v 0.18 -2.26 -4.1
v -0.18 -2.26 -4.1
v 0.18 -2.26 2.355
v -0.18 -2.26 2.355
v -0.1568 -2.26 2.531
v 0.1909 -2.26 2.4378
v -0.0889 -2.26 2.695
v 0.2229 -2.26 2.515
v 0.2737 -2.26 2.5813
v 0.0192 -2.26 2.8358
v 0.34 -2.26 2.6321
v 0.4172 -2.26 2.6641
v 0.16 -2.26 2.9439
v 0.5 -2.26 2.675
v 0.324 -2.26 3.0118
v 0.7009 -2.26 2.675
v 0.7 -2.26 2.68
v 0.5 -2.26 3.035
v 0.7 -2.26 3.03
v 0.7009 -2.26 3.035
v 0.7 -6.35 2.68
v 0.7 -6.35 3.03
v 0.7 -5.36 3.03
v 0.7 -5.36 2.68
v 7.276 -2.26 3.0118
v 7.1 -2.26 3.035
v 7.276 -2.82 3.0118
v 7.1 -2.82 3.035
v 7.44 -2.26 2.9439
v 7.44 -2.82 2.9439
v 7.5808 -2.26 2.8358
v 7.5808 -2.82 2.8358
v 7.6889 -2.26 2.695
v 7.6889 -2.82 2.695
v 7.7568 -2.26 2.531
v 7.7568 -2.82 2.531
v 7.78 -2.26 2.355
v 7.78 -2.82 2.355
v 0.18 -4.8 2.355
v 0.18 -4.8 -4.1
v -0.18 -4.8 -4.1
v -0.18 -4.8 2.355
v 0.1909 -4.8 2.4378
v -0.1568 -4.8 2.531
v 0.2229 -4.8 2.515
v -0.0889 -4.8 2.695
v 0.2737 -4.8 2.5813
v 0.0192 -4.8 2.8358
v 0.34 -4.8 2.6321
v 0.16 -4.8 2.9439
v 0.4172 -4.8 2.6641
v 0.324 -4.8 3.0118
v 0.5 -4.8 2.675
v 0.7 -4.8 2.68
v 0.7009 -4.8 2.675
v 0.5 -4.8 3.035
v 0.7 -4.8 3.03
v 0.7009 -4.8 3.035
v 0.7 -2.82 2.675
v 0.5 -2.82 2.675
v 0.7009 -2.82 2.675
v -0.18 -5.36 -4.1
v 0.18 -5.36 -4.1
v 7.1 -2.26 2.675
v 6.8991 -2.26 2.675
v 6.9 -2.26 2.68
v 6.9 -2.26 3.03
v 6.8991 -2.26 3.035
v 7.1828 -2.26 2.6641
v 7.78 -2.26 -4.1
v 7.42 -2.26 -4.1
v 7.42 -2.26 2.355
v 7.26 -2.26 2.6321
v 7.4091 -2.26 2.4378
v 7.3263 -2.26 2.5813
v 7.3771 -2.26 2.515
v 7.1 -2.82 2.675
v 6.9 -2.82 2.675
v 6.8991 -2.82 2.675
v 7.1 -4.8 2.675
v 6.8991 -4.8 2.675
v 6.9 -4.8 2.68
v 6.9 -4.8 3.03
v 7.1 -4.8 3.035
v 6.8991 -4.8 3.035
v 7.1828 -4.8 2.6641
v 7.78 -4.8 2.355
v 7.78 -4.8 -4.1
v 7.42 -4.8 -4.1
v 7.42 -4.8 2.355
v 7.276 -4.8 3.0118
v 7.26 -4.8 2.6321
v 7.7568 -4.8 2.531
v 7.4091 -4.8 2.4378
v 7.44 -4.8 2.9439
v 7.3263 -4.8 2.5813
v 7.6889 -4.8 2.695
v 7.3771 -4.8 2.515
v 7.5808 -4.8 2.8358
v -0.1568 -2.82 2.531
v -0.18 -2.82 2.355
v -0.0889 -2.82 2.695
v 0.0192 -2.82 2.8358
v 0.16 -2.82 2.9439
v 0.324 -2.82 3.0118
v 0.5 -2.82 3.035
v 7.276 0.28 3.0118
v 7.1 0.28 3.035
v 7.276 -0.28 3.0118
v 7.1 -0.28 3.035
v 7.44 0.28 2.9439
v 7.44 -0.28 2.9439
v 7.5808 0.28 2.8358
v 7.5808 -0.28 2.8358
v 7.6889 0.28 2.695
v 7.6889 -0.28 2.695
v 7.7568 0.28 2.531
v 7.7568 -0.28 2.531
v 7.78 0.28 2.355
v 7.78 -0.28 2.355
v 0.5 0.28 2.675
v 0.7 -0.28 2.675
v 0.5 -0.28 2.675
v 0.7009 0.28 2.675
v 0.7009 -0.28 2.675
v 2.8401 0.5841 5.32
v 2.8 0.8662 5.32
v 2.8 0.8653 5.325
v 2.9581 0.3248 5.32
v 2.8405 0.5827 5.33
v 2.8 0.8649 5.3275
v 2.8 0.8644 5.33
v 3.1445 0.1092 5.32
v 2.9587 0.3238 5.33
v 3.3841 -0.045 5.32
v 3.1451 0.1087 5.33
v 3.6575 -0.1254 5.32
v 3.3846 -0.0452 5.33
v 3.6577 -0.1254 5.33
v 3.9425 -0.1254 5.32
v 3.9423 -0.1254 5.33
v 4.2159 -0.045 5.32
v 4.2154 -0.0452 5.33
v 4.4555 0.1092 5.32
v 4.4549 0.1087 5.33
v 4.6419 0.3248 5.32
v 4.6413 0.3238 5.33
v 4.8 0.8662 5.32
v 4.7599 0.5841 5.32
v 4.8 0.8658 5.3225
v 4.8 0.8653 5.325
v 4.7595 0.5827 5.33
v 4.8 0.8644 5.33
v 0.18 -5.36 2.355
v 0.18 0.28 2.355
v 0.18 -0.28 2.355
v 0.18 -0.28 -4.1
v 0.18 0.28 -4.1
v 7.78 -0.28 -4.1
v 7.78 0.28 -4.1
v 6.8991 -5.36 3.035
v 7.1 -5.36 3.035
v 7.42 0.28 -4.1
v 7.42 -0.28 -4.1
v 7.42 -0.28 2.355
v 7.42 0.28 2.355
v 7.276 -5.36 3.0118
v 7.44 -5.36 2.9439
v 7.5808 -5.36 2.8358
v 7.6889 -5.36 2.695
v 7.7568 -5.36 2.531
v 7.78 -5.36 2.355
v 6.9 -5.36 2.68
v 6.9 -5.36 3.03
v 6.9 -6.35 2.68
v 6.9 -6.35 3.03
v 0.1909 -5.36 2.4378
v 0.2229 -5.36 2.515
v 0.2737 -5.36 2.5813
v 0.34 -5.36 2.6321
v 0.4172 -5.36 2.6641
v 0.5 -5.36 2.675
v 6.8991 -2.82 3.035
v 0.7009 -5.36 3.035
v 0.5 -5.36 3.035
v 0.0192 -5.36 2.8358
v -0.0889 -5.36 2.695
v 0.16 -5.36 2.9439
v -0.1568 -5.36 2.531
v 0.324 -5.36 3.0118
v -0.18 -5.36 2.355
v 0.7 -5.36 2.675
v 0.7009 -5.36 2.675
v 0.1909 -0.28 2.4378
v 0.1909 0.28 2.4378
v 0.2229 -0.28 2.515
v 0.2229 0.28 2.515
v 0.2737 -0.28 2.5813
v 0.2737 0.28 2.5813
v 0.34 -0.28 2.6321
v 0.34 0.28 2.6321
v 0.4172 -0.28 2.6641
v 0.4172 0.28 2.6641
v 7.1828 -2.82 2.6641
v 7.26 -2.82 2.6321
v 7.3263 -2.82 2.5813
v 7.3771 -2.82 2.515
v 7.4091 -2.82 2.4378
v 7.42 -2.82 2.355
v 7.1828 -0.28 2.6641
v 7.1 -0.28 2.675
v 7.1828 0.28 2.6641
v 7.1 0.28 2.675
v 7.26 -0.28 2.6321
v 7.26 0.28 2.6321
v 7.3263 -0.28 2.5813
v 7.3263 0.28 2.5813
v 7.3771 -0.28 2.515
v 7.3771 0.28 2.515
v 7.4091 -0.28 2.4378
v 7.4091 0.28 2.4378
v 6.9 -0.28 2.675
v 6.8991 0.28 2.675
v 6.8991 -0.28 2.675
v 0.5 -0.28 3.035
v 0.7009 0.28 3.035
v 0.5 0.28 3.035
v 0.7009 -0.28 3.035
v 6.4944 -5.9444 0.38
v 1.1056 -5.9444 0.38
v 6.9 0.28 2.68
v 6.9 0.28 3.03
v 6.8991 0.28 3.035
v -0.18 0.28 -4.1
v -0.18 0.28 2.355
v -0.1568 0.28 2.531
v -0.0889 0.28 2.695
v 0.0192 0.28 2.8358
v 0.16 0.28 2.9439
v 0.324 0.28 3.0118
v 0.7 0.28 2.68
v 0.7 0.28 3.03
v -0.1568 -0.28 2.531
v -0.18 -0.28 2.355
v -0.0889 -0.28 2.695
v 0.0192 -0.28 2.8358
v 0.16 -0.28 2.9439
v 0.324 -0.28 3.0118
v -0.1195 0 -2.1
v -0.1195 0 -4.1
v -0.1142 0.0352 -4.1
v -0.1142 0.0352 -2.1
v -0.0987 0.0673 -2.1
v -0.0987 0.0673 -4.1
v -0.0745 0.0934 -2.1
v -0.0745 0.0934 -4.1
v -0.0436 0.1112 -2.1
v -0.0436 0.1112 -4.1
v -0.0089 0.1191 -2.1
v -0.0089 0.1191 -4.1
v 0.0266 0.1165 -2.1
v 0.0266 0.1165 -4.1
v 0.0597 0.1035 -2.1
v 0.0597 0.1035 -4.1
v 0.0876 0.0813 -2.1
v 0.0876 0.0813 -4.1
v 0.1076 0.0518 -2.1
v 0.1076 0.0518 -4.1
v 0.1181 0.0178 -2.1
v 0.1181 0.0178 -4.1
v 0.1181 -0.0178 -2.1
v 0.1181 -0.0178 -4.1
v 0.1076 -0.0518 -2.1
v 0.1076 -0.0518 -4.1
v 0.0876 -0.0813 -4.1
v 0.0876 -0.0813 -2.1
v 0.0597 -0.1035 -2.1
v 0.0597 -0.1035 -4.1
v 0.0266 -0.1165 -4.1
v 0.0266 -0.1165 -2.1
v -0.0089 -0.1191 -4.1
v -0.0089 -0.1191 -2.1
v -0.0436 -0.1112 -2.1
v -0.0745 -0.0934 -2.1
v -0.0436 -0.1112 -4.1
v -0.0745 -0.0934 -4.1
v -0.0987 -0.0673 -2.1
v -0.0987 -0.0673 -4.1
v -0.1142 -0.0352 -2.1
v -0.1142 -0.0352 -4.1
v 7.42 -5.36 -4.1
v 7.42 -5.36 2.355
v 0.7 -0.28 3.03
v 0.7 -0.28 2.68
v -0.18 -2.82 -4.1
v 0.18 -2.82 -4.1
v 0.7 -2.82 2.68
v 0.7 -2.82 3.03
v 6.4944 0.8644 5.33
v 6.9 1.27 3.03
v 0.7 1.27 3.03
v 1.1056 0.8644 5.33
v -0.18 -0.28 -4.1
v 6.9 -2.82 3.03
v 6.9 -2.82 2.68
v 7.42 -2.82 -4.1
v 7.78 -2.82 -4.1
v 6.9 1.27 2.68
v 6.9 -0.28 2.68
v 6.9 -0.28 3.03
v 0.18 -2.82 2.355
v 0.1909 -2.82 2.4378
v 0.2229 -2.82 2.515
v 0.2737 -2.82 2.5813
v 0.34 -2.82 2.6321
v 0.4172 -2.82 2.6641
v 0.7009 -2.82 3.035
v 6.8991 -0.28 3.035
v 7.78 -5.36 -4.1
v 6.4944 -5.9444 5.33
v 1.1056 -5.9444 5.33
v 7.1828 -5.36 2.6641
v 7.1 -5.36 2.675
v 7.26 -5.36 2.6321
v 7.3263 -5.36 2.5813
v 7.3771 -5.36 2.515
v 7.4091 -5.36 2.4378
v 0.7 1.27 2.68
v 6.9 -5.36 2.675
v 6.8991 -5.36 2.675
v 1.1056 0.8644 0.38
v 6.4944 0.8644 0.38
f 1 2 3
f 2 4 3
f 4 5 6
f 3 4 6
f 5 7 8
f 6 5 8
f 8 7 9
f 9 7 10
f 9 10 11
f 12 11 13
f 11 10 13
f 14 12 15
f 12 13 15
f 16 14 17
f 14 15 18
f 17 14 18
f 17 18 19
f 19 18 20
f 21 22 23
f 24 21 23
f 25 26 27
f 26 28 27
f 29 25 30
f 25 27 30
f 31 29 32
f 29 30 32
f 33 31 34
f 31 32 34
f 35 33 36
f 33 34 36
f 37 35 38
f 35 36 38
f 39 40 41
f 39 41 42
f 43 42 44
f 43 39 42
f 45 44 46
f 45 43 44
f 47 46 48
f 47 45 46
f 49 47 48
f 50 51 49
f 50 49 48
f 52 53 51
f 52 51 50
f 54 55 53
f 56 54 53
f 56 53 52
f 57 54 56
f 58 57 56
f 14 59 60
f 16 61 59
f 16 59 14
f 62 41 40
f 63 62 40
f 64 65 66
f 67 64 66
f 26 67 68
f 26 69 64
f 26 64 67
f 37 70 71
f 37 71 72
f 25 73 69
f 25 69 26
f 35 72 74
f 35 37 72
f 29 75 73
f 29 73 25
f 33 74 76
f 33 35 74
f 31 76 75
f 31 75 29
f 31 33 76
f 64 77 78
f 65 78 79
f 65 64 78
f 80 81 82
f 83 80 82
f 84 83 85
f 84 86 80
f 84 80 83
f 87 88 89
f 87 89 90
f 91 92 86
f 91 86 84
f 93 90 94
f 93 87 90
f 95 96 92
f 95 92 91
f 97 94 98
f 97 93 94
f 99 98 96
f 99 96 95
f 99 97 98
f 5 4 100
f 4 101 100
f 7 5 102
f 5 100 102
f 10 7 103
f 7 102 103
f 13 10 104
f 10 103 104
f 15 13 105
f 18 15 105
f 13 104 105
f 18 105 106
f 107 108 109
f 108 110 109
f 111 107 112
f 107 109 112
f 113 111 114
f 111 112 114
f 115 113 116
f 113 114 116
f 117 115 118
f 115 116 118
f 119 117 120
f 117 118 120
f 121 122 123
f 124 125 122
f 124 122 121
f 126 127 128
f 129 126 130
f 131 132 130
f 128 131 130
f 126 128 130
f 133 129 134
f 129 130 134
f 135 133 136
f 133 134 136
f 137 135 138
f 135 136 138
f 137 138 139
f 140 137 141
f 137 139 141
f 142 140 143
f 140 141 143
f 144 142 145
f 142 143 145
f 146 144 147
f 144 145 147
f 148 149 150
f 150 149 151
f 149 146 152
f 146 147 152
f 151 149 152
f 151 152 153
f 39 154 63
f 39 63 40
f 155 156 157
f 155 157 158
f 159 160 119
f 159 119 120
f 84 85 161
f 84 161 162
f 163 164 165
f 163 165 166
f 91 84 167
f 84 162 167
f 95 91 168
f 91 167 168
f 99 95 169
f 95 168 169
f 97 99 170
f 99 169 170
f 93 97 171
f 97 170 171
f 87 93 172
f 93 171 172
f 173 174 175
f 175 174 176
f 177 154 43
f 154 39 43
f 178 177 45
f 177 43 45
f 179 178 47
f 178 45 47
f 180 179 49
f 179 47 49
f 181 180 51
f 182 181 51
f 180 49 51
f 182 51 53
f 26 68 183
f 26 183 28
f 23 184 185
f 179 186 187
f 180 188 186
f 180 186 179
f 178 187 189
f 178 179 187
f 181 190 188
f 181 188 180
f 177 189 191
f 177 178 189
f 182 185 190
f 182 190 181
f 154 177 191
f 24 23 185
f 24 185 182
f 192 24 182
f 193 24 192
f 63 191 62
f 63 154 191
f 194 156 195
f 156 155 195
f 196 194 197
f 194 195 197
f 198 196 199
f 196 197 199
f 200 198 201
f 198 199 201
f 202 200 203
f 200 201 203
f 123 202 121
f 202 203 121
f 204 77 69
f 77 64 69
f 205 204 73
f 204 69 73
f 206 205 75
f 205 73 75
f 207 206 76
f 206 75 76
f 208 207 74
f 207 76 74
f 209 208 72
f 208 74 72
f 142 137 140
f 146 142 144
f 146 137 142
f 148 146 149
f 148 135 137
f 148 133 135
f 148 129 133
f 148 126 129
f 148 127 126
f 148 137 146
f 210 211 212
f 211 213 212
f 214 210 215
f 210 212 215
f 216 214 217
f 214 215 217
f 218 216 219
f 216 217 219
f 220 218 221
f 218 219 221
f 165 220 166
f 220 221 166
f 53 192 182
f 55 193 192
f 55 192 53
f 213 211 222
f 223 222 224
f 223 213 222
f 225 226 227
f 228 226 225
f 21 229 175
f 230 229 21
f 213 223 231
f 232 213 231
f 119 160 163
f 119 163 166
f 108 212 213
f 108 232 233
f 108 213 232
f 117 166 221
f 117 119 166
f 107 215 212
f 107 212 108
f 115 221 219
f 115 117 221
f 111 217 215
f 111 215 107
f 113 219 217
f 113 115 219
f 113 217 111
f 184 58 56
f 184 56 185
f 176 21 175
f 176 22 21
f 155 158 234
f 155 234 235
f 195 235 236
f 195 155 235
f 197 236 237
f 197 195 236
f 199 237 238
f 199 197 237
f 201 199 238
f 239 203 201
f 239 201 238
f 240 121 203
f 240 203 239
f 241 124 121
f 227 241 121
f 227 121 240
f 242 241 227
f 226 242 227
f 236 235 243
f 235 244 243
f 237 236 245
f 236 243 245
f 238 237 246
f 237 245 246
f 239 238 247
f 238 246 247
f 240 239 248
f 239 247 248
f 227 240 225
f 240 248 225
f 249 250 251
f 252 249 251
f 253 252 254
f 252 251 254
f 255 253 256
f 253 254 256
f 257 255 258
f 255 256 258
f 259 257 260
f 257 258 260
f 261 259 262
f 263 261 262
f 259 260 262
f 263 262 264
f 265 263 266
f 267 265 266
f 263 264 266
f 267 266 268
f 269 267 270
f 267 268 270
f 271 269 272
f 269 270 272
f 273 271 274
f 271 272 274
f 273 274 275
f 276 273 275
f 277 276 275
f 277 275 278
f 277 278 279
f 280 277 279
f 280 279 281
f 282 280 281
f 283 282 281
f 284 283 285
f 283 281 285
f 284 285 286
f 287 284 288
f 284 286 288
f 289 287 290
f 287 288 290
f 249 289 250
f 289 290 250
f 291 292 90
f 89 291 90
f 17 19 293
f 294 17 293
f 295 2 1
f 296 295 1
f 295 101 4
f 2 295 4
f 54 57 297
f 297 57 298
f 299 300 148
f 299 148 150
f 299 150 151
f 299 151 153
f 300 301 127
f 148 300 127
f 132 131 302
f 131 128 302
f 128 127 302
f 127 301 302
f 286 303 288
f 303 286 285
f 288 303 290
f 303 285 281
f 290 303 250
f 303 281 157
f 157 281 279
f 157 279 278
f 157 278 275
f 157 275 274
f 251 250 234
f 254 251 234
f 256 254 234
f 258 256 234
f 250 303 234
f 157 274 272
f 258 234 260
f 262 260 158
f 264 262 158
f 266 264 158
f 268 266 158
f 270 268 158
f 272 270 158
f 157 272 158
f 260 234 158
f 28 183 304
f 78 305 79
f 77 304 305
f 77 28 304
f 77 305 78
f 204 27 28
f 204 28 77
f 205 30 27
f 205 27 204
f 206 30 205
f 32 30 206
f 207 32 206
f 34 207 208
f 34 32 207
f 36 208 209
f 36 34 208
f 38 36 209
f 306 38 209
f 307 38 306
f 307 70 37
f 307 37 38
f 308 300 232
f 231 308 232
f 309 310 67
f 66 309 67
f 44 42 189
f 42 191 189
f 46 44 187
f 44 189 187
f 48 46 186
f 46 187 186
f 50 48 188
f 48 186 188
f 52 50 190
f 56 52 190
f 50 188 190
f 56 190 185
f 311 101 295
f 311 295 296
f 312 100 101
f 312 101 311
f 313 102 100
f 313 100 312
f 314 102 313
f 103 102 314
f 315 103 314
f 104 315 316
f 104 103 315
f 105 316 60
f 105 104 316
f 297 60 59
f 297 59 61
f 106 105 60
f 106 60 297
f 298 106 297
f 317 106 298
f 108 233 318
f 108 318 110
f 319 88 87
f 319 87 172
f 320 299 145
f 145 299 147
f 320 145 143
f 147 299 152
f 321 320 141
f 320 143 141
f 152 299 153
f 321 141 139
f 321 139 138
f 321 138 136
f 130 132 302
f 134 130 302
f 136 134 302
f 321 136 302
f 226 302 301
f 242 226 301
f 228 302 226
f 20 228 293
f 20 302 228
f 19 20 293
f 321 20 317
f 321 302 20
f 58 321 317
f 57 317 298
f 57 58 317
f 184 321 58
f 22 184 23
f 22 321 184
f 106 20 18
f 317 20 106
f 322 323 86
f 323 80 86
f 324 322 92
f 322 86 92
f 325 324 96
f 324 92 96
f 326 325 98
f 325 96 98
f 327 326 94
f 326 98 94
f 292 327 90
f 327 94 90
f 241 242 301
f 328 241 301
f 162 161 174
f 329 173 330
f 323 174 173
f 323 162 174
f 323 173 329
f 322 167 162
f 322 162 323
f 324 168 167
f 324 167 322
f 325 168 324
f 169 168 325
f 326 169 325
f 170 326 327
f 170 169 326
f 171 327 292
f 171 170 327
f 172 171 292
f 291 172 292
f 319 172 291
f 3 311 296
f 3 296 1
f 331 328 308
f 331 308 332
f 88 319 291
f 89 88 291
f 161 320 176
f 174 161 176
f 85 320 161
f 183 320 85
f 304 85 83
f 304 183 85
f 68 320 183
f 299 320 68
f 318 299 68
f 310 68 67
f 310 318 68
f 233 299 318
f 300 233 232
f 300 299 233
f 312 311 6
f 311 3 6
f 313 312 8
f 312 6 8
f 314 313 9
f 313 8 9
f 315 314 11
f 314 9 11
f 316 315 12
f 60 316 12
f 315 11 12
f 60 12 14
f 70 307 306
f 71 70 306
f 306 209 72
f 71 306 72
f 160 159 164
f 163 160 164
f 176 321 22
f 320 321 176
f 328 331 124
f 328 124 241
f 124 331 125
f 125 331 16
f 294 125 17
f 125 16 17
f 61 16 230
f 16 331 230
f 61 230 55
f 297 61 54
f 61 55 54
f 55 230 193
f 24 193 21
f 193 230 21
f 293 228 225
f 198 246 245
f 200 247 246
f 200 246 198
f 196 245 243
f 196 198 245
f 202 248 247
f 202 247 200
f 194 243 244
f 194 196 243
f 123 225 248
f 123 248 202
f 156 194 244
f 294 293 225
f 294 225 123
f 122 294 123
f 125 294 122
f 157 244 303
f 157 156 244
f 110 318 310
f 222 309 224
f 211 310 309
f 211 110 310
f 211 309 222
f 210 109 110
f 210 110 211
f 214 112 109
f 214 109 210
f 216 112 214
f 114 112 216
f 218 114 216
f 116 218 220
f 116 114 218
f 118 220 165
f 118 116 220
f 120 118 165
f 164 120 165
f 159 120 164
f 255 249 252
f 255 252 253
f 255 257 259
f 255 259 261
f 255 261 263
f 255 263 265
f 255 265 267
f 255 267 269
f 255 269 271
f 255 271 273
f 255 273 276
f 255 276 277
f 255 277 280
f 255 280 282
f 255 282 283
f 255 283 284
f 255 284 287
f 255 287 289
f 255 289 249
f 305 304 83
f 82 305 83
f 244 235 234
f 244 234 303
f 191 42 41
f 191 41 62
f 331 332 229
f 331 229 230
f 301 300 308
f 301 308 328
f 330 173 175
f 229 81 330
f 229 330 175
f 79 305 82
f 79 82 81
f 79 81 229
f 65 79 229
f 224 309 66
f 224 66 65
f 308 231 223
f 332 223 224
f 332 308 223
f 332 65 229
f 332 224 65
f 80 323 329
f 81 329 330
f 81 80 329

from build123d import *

# Parameters (mm, degrees)
EXTRUDE_1_DEPTH     = 4.95
SKETCH_5_W          = 0.36
SKETCH_5_H          = 0.56
SKETCH_5_2_W        = 0.36
SKETCH_5_2_H        = 0.56
EXTRUDE_2_DEPTH     = 4.1
CHAMFER_1_SIZE      = 2.3
CHAMFER_1_SIZE_2    = 0.405552056
SKETCH_6_R          = 1
CUT_EXTRUDE_1_DEPTH = 0.01
SKETCH_7_W          = 10.556189846
SKETCH_7_H          = 3.652287582
CUT_EXTRUDE_2_DEPTH = 20
CHAMFER_2_SIZE      = 2.3
CHAMFER_2_SIZE2     = 0.405552056
SKETCH_8_R          = 0.119462925
CUT_EXTRUDE_3_DEPTH = 2


with BuildPart() as part:
    # Эскиз3 → Вытянуть1 (new body)
    with BuildSketch(Plane.XY.offset(5.33)):
        Polygon((0.7, 1.27), (3.8, 1.27), (6.9, 1.27), (6.9, -8.89), (0.7, -8.89), align=None)
    extrude(amount=-EXTRUDE_1_DEPTH)

    # По траектории1: sweep along a path in Эскиз4
    with BuildLine(Plane(origin=(0, 0, 0), x_dir=(1, 0, 0), z_dir=(0, 1, 0))) as sweep_1_path:
        Line((0, 0), (0, -2.355))
        ThreePointArc((0, -2.355), (0.146446609, -2.708553391), (0.5, -2.855))
        Line((0.5, -2.855), (0.7, -2.855))
        Line((0.7, -2.855), (6.9, -2.855))
        Line((6.9, -2.855), (7.1, -2.855))
        ThreePointArc((7.1, -2.855), (7.453553391, -2.708553391), (7.6, -2.355))
        Line((7.6, -2.355), (7.6, 0))
        Line((7.6, 0), (7.6, 4.1))
    # Эскиз5 → По траектории1 (sweep)
    with BuildSketch(Plane.XY):
        with Locations((0, -2.54)):
            Rectangle(SKETCH_5_W, SKETCH_5_H)
        Rectangle(SKETCH_5_W, SKETCH_5_H)
        with Locations((0, -5.08)):
            Rectangle(SKETCH_5_W, SKETCH_5_H)
        with Locations((0, -7.62)):
            Rectangle(SKETCH_5_W, SKETCH_5_H)
    sweep(path=sweep_1_path.line)

    # Эскиз5<2> → Вытянуть2 (add)
    with BuildSketch(Plane.XY):
        with Locations((0, -2.54)):
            Rectangle(SKETCH_5_2_W, SKETCH_5_2_H)
        Rectangle(SKETCH_5_2_W, SKETCH_5_2_H)
        with Locations((0, -5.08)):
            Rectangle(SKETCH_5_2_W, SKETCH_5_2_H)
        with Locations((0, -7.62)):
            Rectangle(SKETCH_5_2_W, SKETCH_5_2_H)
    extrude(amount=-EXTRUDE_2_DEPTH)

    # Фаска1
    # the kernel refuses this chamfer: 2.3, 0.405552056 mm, written as the material it takes off along each edge
    with BuildSketch(Plane(origin=(12.876639232, -8.89, 0.38), x_dir=(0, -0.006682531656101655, 0.9999776716360548), z_dir=(-1, 0, 0))) as chamfer_1_piece_1:
        Polygon((CHAMFER_1_SIZE * 0.999977671636, CHAMFER_1_SIZE * 0.0066825316561), (-CHAMFER_1_SIZE_2 * 0.00668253165, CHAMFER_1_SIZE_2 * 0.999977670722), (0, 0), align=None)
    extrude(amount=18.153278464, mode=Mode.SUBTRACT)
    with BuildSketch(Plane(origin=(12.876639232, -8.89, 5.33), x_dir=(0, 0.9776715712462588, 0.2101387607674306), z_dir=(-1, 0, 0))) as chamfer_1_piece_2:
        Polygon((CHAMFER_1_SIZE_2 * 0.977671570353, CHAMFER_1_SIZE_2 * 0.210138760575), (-CHAMFER_1_SIZE * 0.210138760767, CHAMFER_1_SIZE * 0.977671571246), (0, 0), align=None)
    extrude(amount=18.153278464, mode=Mode.SUBTRACT)
    with BuildSketch(Plane(origin=(6.9, 7.246639232, 0.38), x_dir=(0.006682531656101655, 0, 0.9999776716360548), z_dir=(0, -1, 0))) as chamfer_1_piece_3_section:
        Polygon((CHAMFER_1_SIZE * 0.999977671636, CHAMFER_1_SIZE * 0.0066825316561), (-CHAMFER_1_SIZE_2 * 0.00668253165, CHAMFER_1_SIZE_2 * 0.999977670722), (0, 0), align=None)
    chamfer_1_piece_3 = extrude(amount=22.113278464, mode=Mode.PRIVATE)
    chamfer_1_piece_3 = split(chamfer_1_piece_3, bisect_by=Plane(origin=(6.899706122, 0.28, 2.676666667), z_dir=(0, 1, 0)), keep=Keep.TOP, mode=Mode.PRIVATE)
    add(chamfer_1_piece_3, mode=Mode.SUBTRACT)
    with BuildSketch(Plane(origin=(6.9, 7.246639232, 0.38), x_dir=(0.006682531656101655, 0, 0.9999776716360548), z_dir=(0, -1, 0))) as chamfer_1_piece_4_section:
        Polygon((CHAMFER_1_SIZE * 0.999977671636, CHAMFER_1_SIZE * 0.0066825316561), (-CHAMFER_1_SIZE_2 * 0.00668253165, CHAMFER_1_SIZE_2 * 0.999977670722), (0, 0), align=None)
    chamfer_1_piece_4 = extrude(amount=22.113278464, mode=Mode.PRIVATE)
    chamfer_1_piece_4 = split(chamfer_1_piece_4, bisect_by=Plane(origin=(6.764815344, 0, 2.675), z_dir=(0, 0, -1)), keep=Keep.TOP, mode=Mode.PRIVATE)
    add(chamfer_1_piece_4, mode=Mode.SUBTRACT)
    with BuildSketch(Plane(origin=(6.9, 7.246639232, 0.38), x_dir=(0.006682531656101655, 0, 0.9999776716360548), z_dir=(0, -1, 0))) as chamfer_1_piece_5_section:
        Polygon((CHAMFER_1_SIZE * 0.999977671636, CHAMFER_1_SIZE * 0.0066825316561), (-CHAMFER_1_SIZE_2 * 0.00668253165, CHAMFER_1_SIZE_2 * 0.999977670722), (0, 0), align=None)
    chamfer_1_piece_5 = extrude(amount=22.113278464, mode=Mode.PRIVATE)
    chamfer_1_piece_5 = split(chamfer_1_piece_5, bisect_by=Plane(origin=(6.899706122, -2.26, 2.676666667), z_dir=(0, 1, 0)), keep=Keep.TOP, mode=Mode.PRIVATE)
    chamfer_1_piece_5 = split(chamfer_1_piece_5, bisect_by=Plane(origin=(6.899706122, -0.28, 2.676666667), z_dir=(0, -1, 0)), keep=Keep.TOP, mode=Mode.PRIVATE)
    add(chamfer_1_piece_5, mode=Mode.SUBTRACT)
    with BuildSketch(Plane(origin=(6.9, 7.246639232, 0.38), x_dir=(0.006682531656101655, 0, 0.9999776716360548), z_dir=(0, -1, 0))) as chamfer_1_piece_6_section:
        Polygon((CHAMFER_1_SIZE * 0.999977671636, CHAMFER_1_SIZE * 0.0066825316561), (-CHAMFER_1_SIZE_2 * 0.00668253165, CHAMFER_1_SIZE_2 * 0.999977670722), (0, 0), align=None)
    chamfer_1_piece_6 = extrude(amount=22.113278464, mode=Mode.PRIVATE)
    chamfer_1_piece_6 = split(chamfer_1_piece_6, bisect_by=Plane(origin=(6.899706122, -2.82, 2.676666667), z_dir=(0, -1, 0)), keep=Keep.TOP, mode=Mode.PRIVATE)
    chamfer_1_piece_6 = split(chamfer_1_piece_6, bisect_by=Plane(origin=(6.899706122, -4.8, 2.676666667), z_dir=(0, 1, 0)), keep=Keep.TOP, mode=Mode.PRIVATE)
    add(chamfer_1_piece_6, mode=Mode.SUBTRACT)
    with BuildSketch(Plane(origin=(6.9, 7.246639232, 0.38), x_dir=(0.006682531656101655, 0, 0.9999776716360548), z_dir=(0, -1, 0))) as chamfer_1_piece_7_section:
        Polygon((CHAMFER_1_SIZE * 0.999977671636, CHAMFER_1_SIZE * 0.0066825316561), (-CHAMFER_1_SIZE_2 * 0.00668253165, CHAMFER_1_SIZE_2 * 0.999977670722), (0, 0), align=None)
    chamfer_1_piece_7 = extrude(amount=22.113278464, mode=Mode.PRIVATE)
    chamfer_1_piece_7 = split(chamfer_1_piece_7, bisect_by=Plane(origin=(6.899706122, -7.34, 2.676666667), z_dir=(0, 1, 0)), keep=Keep.TOP, mode=Mode.PRIVATE)
    chamfer_1_piece_7 = split(chamfer_1_piece_7, bisect_by=Plane(origin=(6.899706122, -5.36, 2.676666667), z_dir=(0, -1, 0)), keep=Keep.TOP, mode=Mode.PRIVATE)
    add(chamfer_1_piece_7, mode=Mode.SUBTRACT)
    with BuildSketch(Plane(origin=(6.9, 7.246639232, 0.38), x_dir=(0.006682531656101655, 0, 0.9999776716360548), z_dir=(0, -1, 0))) as chamfer_1_piece_8_section:
        Polygon((CHAMFER_1_SIZE * 0.999977671636, CHAMFER_1_SIZE * 0.0066825316561), (-CHAMFER_1_SIZE_2 * 0.00668253165, CHAMFER_1_SIZE_2 * 0.999977670722), (0, 0), align=None)
    chamfer_1_piece_8 = extrude(amount=22.113278464, mode=Mode.PRIVATE)
    chamfer_1_piece_8 = split(chamfer_1_piece_8, bisect_by=Plane(origin=(6.899706122, -7.9, 2.676666667), z_dir=(0, -1, 0)), keep=Keep.TOP, mode=Mode.PRIVATE)
    add(chamfer_1_piece_8, mode=Mode.SUBTRACT)
    with BuildSketch(Plane(origin=(6.9, 7.246639232, 5.33), x_dir=(-0.9776715712462587, 0, 0.21013876076743102), z_dir=(0, -1, 0))) as chamfer_1_piece_9_section:
        Polygon((CHAMFER_1_SIZE_2 * 0.977671570353, CHAMFER_1_SIZE_2 * 0.210138760575), (-CHAMFER_1_SIZE * 0.210138760767, CHAMFER_1_SIZE * 0.977671571246), (0, 0), align=None)
    chamfer_1_piece_9 = extrude(amount=22.113278464, mode=Mode.PRIVATE)
    chamfer_1_piece_9 = split(chamfer_1_piece_9, bisect_by=Plane(origin=(6.764815344, 0.775, 3.035), z_dir=(0, 0, 1)), keep=Keep.TOP, mode=Mode.PRIVATE)
    add(chamfer_1_piece_9, mode=Mode.SUBTRACT)
    with BuildSketch(Plane(origin=(6.9, 7.246639232, 5.33), x_dir=(-0.9776715712462587, 0, 0.21013876076743102), z_dir=(0, -1, 0))) as chamfer_1_piece_10_section:
        Polygon((CHAMFER_1_SIZE_2 * 0.977671570353, CHAMFER_1_SIZE_2 * 0.210138760575), (-CHAMFER_1_SIZE * 0.210138760767, CHAMFER_1_SIZE * 0.977671571246), (0, 0), align=None)
    chamfer_1_piece_10 = extrude(amount=22.113278464, mode=Mode.PRIVATE)
    chamfer_1_piece_10 = split(chamfer_1_piece_10, bisect_by=Plane(origin=(6.899706122, 0.28, 3.033333333), z_dir=(0, 1, 0)), keep=Keep.TOP, mode=Mode.PRIVATE)
    add(chamfer_1_piece_10, mode=Mode.SUBTRACT)
    with BuildSketch(Plane(origin=(6.9, 7.246639232, 5.33), x_dir=(-0.9776715712462587, 0, 0.21013876076743102), z_dir=(0, -1, 0))) as chamfer_1_piece_11_section:
        Polygon((CHAMFER_1_SIZE_2 * 0.977671570353, CHAMFER_1_SIZE_2 * 0.210138760575), (-CHAMFER_1_SIZE * 0.210138760767, CHAMFER_1_SIZE * 0.977671571246), (0, 0), align=None)
    chamfer_1_piece_11 = extrude(amount=22.113278464, mode=Mode.PRIVATE)
    chamfer_1_piece_11 = split(chamfer_1_piece_11, bisect_by=Plane(origin=(6.899706122, -2.26, 3.033333333), z_dir=(0, 1, 0)), keep=Keep.TOP, mode=Mode.PRIVATE)
    chamfer_1_piece_11 = split(chamfer_1_piece_11, bisect_by=Plane(origin=(6.899706122, -0.28, 3.033333333), z_dir=(0, -1, 0)), keep=Keep.TOP, mode=Mode.PRIVATE)
    add(chamfer_1_piece_11, mode=Mode.SUBTRACT)
    with BuildSketch(Plane(origin=(6.9, 7.246639232, 5.33), x_dir=(-0.9776715712462587, 0, 0.21013876076743102), z_dir=(0, -1, 0))) as chamfer_1_piece_12_section:
        Polygon((CHAMFER_1_SIZE_2 * 0.977671570353, CHAMFER_1_SIZE_2 * 0.210138760575), (-CHAMFER_1_SIZE * 0.210138760767, CHAMFER_1_SIZE * 0.977671571246), (0, 0), align=None)
    chamfer_1_piece_12 = extrude(amount=22.113278464, mode=Mode.PRIVATE)
    chamfer_1_piece_12 = split(chamfer_1_piece_12, bisect_by=Plane(origin=(6.899706122, -2.82, 3.033333333), z_dir=(0, -1, 0)), keep=Keep.TOP, mode=Mode.PRIVATE)
    chamfer_1_piece_12 = split(chamfer_1_piece_12, bisect_by=Plane(origin=(6.899706122, -4.8, 3.033333333), z_dir=(0, 1, 0)), keep=Keep.TOP, mode=Mode.PRIVATE)
    add(chamfer_1_piece_12, mode=Mode.SUBTRACT)
    with BuildSketch(Plane(origin=(6.9, 7.246639232, 5.33), x_dir=(-0.9776715712462587, 0, 0.21013876076743102), z_dir=(0, -1, 0))) as chamfer_1_piece_13_section:
        Polygon((CHAMFER_1_SIZE_2 * 0.977671570353, CHAMFER_1_SIZE_2 * 0.210138760575), (-CHAMFER_1_SIZE * 0.210138760767, CHAMFER_1_SIZE * 0.977671571246), (0, 0), align=None)
    chamfer_1_piece_13 = extrude(amount=22.113278464, mode=Mode.PRIVATE)
    chamfer_1_piece_13 = split(chamfer_1_piece_13, bisect_by=Plane(origin=(6.899706122, -7.34, 3.033333333), z_dir=(0, 1, 0)), keep=Keep.TOP, mode=Mode.PRIVATE)
    chamfer_1_piece_13 = split(chamfer_1_piece_13, bisect_by=Plane(origin=(6.899706122, -5.36, 3.033333333), z_dir=(0, -1, 0)), keep=Keep.TOP, mode=Mode.PRIVATE)
    add(chamfer_1_piece_13, mode=Mode.SUBTRACT)
    with BuildSketch(Plane(origin=(6.9, 7.246639232, 5.33), x_dir=(-0.9776715712462587, 0, 0.21013876076743102), z_dir=(0, -1, 0))) as chamfer_1_piece_14_section:
        Polygon((CHAMFER_1_SIZE_2 * 0.977671570353, CHAMFER_1_SIZE_2 * 0.210138760575), (-CHAMFER_1_SIZE * 0.210138760767, CHAMFER_1_SIZE * 0.977671571246), (0, 0), align=None)
    chamfer_1_piece_14 = extrude(amount=22.113278464, mode=Mode.PRIVATE)
    chamfer_1_piece_14 = split(chamfer_1_piece_14, bisect_by=Plane(origin=(6.899706122, -7.9, 3.033333333), z_dir=(0, -1, 0)), keep=Keep.TOP, mode=Mode.PRIVATE)
    add(chamfer_1_piece_14, mode=Mode.SUBTRACT)
    with BuildSketch(Plane(origin=(12.876639232, 1.27, 0.38), x_dir=(0, 0.006682531656101748, 0.9999776716360548), z_dir=(-1, 0, 0)), Plane(origin=(-5.276639232, 1.27, 5.33), x_dir=(0, 0.006682531656101748, -0.9999776716360548), z_dir=(1, 0, 0))) as chamfer_1_piece_15:
        Polygon((CHAMFER_1_SIZE * 0.999977671636, -CHAMFER_1_SIZE * 0.0066825316561), (-CHAMFER_1_SIZE_2 * 0.00668253165, -CHAMFER_1_SIZE_2 * 0.999977670722), (0, 0), align=None)
    extrude(amount=18.153278464, mode=Mode.SUBTRACT)
    with BuildSketch(Plane(origin=(0.7, -14.866639232, 0.38), x_dir=(0.9776715712462587, 0, -0.2101387607674313), z_dir=(0, 1, 0))) as chamfer_1_piece_16_section:
        Polygon((CHAMFER_1_SIZE_2 * 0.977671570353, -CHAMFER_1_SIZE_2 * 0.210138760575), (-CHAMFER_1_SIZE * 0.210138760767, -CHAMFER_1_SIZE * 0.977671571246), (0, 0), align=None)
    chamfer_1_piece_16 = extrude(amount=22.113278464, mode=Mode.PRIVATE)
    chamfer_1_piece_16 = split(chamfer_1_piece_16, bisect_by=Plane(origin=(0.835184656, -8.395, 2.675), z_dir=(0, 0, -1)), keep=Keep.TOP, mode=Mode.PRIVATE)
    add(chamfer_1_piece_16, mode=Mode.SUBTRACT)
    with BuildSketch(Plane(origin=(0.7, -14.866639232, 0.38), x_dir=(0.9776715712462587, 0, -0.2101387607674313), z_dir=(0, 1, 0))) as chamfer_1_piece_17_section:
        Polygon((CHAMFER_1_SIZE_2 * 0.977671570353, -CHAMFER_1_SIZE_2 * 0.210138760575), (-CHAMFER_1_SIZE * 0.210138760767, -CHAMFER_1_SIZE * 0.977671571246), (0, 0), align=None)
    chamfer_1_piece_17 = extrude(amount=22.113278464, mode=Mode.PRIVATE)
    chamfer_1_piece_17 = split(chamfer_1_piece_17, bisect_by=Plane(origin=(0.700293878, -7.9, 2.676666667), z_dir=(0, -1, 0)), keep=Keep.TOP, mode=Mode.PRIVATE)
    add(chamfer_1_piece_17, mode=Mode.SUBTRACT)
    with BuildSketch(Plane(origin=(0.7, -14.866639232, 0.38), x_dir=(0.9776715712462587, 0, -0.2101387607674313), z_dir=(0, 1, 0))) as chamfer_1_piece_18_section:
        Polygon((CHAMFER_1_SIZE_2 * 0.977671570353, -CHAMFER_1_SIZE_2 * 0.210138760575), (-CHAMFER_1_SIZE * 0.210138760767, -CHAMFER_1_SIZE * 0.977671571246), (0, 0), align=None)
    chamfer_1_piece_18 = extrude(amount=22.113278464, mode=Mode.PRIVATE)
    chamfer_1_piece_18 = split(chamfer_1_piece_18, bisect_by=Plane(origin=(0.700293878, -5.36, 2.676666667), z_dir=(0, -1, 0)), keep=Keep.TOP, mode=Mode.PRIVATE)
    chamfer_1_piece_18 = split(chamfer_1_piece_18, bisect_by=Plane(origin=(0.700293878, -7.34, 2.676666667), z_dir=(0, 1, 0)), keep=Keep.TOP, mode=Mode.PRIVATE)
    add(chamfer_1_piece_18, mode=Mode.SUBTRACT)
    with BuildSketch(Plane(origin=(0.7, -14.866639232, 0.38), x_dir=(0.9776715712462587, 0, -0.2101387607674313), z_dir=(0, 1, 0))) as chamfer_1_piece_19_section:
        Polygon((CHAMFER_1_SIZE_2 * 0.977671570353, -CHAMFER_1_SIZE_2 * 0.210138760575), (-CHAMFER_1_SIZE * 0.210138760767, -CHAMFER_1_SIZE * 0.977671571246), (0, 0), align=None)
    chamfer_1_piece_19 = extrude(amount=22.113278464, mode=Mode.PRIVATE)
    chamfer_1_piece_19 = split(chamfer_1_piece_19, bisect_by=Plane(origin=(0.700293878, -2.82, 2.676666667), z_dir=(0, -1, 0)), keep=Keep.TOP, mode=Mode.PRIVATE)
    chamfer_1_piece_19 = split(chamfer_1_piece_19, bisect_by=Plane(origin=(0.700293878, -4.8, 2.676666667), z_dir=(0, 1, 0)), keep=Keep.TOP, mode=Mode.PRIVATE)
    add(chamfer_1_piece_19, mode=Mode.SUBTRACT)
    with BuildSketch(Plane(origin=(0.7, -14.866639232, 0.38), x_dir=(0.9776715712462587, 0, -0.2101387607674313), z_dir=(0, 1, 0))) as chamfer_1_piece_20_section:
        Polygon((CHAMFER_1_SIZE_2 * 0.977671570353, -CHAMFER_1_SIZE_2 * 0.210138760575), (-CHAMFER_1_SIZE * 0.210138760767, -CHAMFER_1_SIZE * 0.977671571246), (0, 0), align=None)
    chamfer_1_piece_20 = extrude(amount=22.113278464, mode=Mode.PRIVATE)
    chamfer_1_piece_20 = split(chamfer_1_piece_20, bisect_by=Plane(origin=(0.700293878, -0.28, 2.676666667), z_dir=(0, -1, 0)), keep=Keep.TOP, mode=Mode.PRIVATE)
    chamfer_1_piece_20 = split(chamfer_1_piece_20, bisect_by=Plane(origin=(0.700293878, -2.26, 2.676666667), z_dir=(0, 1, 0)), keep=Keep.TOP, mode=Mode.PRIVATE)
    add(chamfer_1_piece_20, mode=Mode.SUBTRACT)
    with BuildSketch(Plane(origin=(0.7, -14.866639232, 0.38), x_dir=(0.9776715712462587, 0, -0.2101387607674313), z_dir=(0, 1, 0))) as chamfer_1_piece_21_section:
        Polygon((CHAMFER_1_SIZE_2 * 0.977671570353, -CHAMFER_1_SIZE_2 * 0.210138760575), (-CHAMFER_1_SIZE * 0.210138760767, -CHAMFER_1_SIZE * 0.977671571246), (0, 0), align=None)
    chamfer_1_piece_21 = extrude(amount=22.113278464, mode=Mode.PRIVATE)
    chamfer_1_piece_21 = split(chamfer_1_piece_21, bisect_by=Plane(origin=(0.700293878, 0.28, 2.676666667), z_dir=(0, 1, 0)), keep=Keep.TOP, mode=Mode.PRIVATE)
    add(chamfer_1_piece_21, mode=Mode.SUBTRACT)
    with BuildSketch(Plane(origin=(0.7, -14.866639232, 5.33), x_dir=(0.9776715712462587, 0, 0.2101387607674309), z_dir=(0, 1, 0))) as chamfer_1_piece_22_section:
        Polygon((CHAMFER_1_SIZE_2 * 0.977671570353, CHAMFER_1_SIZE_2 * 0.210138760575), (-CHAMFER_1_SIZE * 0.210138760767, CHAMFER_1_SIZE * 0.977671571246), (0, 0), align=None)
    chamfer_1_piece_22 = extrude(amount=22.113278464, mode=Mode.PRIVATE)
    chamfer_1_piece_22 = split(chamfer_1_piece_22, bisect_by=Plane(origin=(0.835184656, -8.395, 3.035), z_dir=(0, 0, 1)), keep=Keep.TOP, mode=Mode.PRIVATE)
    add(chamfer_1_piece_22, mode=Mode.SUBTRACT)
    with BuildSketch(Plane(origin=(0.7, -14.866639232, 5.33), x_dir=(0.9776715712462587, 0, 0.2101387607674309), z_dir=(0, 1, 0))) as chamfer_1_piece_23_section:
        Polygon((CHAMFER_1_SIZE_2 * 0.977671570353, CHAMFER_1_SIZE_2 * 0.210138760575), (-CHAMFER_1_SIZE * 0.210138760767, CHAMFER_1_SIZE * 0.977671571246), (0, 0), align=None)
    chamfer_1_piece_23 = extrude(amount=22.113278464, mode=Mode.PRIVATE)
    chamfer_1_piece_23 = split(chamfer_1_piece_23, bisect_by=Plane(origin=(0.700293878, -7.9, 3.033333333), z_dir=(0, -1, 0)), keep=Keep.TOP, mode=Mode.PRIVATE)
    add(chamfer_1_piece_23, mode=Mode.SUBTRACT)
    with BuildSketch(Plane(origin=(0.7, -14.866639232, 5.33), x_dir=(0.9776715712462587, 0, 0.2101387607674309), z_dir=(0, 1, 0))) as chamfer_1_piece_24_section:
        Polygon((CHAMFER_1_SIZE_2 * 0.977671570353, CHAMFER_1_SIZE_2 * 0.210138760575), (-CHAMFER_1_SIZE * 0.210138760767, CHAMFER_1_SIZE * 0.977671571246), (0, 0), align=None)
    chamfer_1_piece_24 = extrude(amount=22.113278464, mode=Mode.PRIVATE)
    chamfer_1_piece_24 = split(chamfer_1_piece_24, bisect_by=Plane(origin=(0.700293878, -5.36, 3.033333333), z_dir=(0, -1, 0)), keep=Keep.TOP, mode=Mode.PRIVATE)
    chamfer_1_piece_24 = split(chamfer_1_piece_24, bisect_by=Plane(origin=(0.700293878, -7.34, 3.033333333), z_dir=(0, 1, 0)), keep=Keep.TOP, mode=Mode.PRIVATE)
    add(chamfer_1_piece_24, mode=Mode.SUBTRACT)
    with BuildSketch(Plane(origin=(0.7, -14.866639232, 5.33), x_dir=(0.9776715712462587, 0, 0.2101387607674309), z_dir=(0, 1, 0))) as chamfer_1_piece_25_section:
        Polygon((CHAMFER_1_SIZE_2 * 0.977671570353, CHAMFER_1_SIZE_2 * 0.210138760575), (-CHAMFER_1_SIZE * 0.210138760767, CHAMFER_1_SIZE * 0.977671571246), (0, 0), align=None)
    chamfer_1_piece_25 = extrude(amount=22.113278464, mode=Mode.PRIVATE)
    chamfer_1_piece_25 = split(chamfer_1_piece_25, bisect_by=Plane(origin=(0.700293878, -2.82, 3.033333333), z_dir=(0, -1, 0)), keep=Keep.TOP, mode=Mode.PRIVATE)
    chamfer_1_piece_25 = split(chamfer_1_piece_25, bisect_by=Plane(origin=(0.700293878, -4.8, 3.033333333), z_dir=(0, 1, 0)), keep=Keep.TOP, mode=Mode.PRIVATE)
    add(chamfer_1_piece_25, mode=Mode.SUBTRACT)
    with BuildSketch(Plane(origin=(0.7, -14.866639232, 5.33), x_dir=(0.9776715712462587, 0, 0.2101387607674309), z_dir=(0, 1, 0))) as chamfer_1_piece_26_section:
        Polygon((CHAMFER_1_SIZE_2 * 0.977671570353, CHAMFER_1_SIZE_2 * 0.210138760575), (-CHAMFER_1_SIZE * 0.210138760767, CHAMFER_1_SIZE * 0.977671571246), (0, 0), align=None)
    chamfer_1_piece_26 = extrude(amount=22.113278464, mode=Mode.PRIVATE)
    chamfer_1_piece_26 = split(chamfer_1_piece_26, bisect_by=Plane(origin=(0.700293878, -0.28, 3.033333333), z_dir=(0, -1, 0)), keep=Keep.TOP, mode=Mode.PRIVATE)
    chamfer_1_piece_26 = split(chamfer_1_piece_26, bisect_by=Plane(origin=(0.700293878, -2.26, 3.033333333), z_dir=(0, 1, 0)), keep=Keep.TOP, mode=Mode.PRIVATE)
    add(chamfer_1_piece_26, mode=Mode.SUBTRACT)
    with BuildSketch(Plane(origin=(0.7, -14.866639232, 5.33), x_dir=(0.9776715712462587, 0, 0.2101387607674309), z_dir=(0, 1, 0))) as chamfer_1_piece_27_section:
        Polygon((CHAMFER_1_SIZE_2 * 0.977671570353, CHAMFER_1_SIZE_2 * 0.210138760575), (-CHAMFER_1_SIZE * 0.210138760767, CHAMFER_1_SIZE * 0.977671571246), (0, 0), align=None)
    chamfer_1_piece_27 = extrude(amount=22.113278464, mode=Mode.PRIVATE)
    chamfer_1_piece_27 = split(chamfer_1_piece_27, bisect_by=Plane(origin=(0.700293878, 0.28, 3.033333333), z_dir=(0, 1, 0)), keep=Keep.TOP, mode=Mode.PRIVATE)
    add(chamfer_1_piece_27, mode=Mode.SUBTRACT)

    # Эскиз6 → Вырез-Вытянуть1 (cut)
    with BuildSketch(Plane.XY.offset(5.33)):
        with Locations((3.8, 0.864447944)):
            Circle(SKETCH_6_R)
    extrude(amount=-CUT_EXTRUDE_1_DEPTH, mode=Mode.SUBTRACT)

    # Эскиз7 → Вырез-Вытянуть2 (cut)
    with BuildSketch(Plane.XY.offset(5.33)):
        with Locations((4.103600287, -8.176143791)):
            Rectangle(SKETCH_7_W, SKETCH_7_H)
    extrude(amount=-CUT_EXTRUDE_2_DEPTH, mode=Mode.SUBTRACT)

    # Фаска2
    chamfer_2_edges = [part.edges().sort_by_distance(p)[0] for p in [
        (3.8, -6.35, 0.38),
        (3.8, -6.35, 5.33),
    ]]
    chamfer_2_side = [part.faces().sort_by_distance(p)[0] for p in [
        (3.8, -6.35, 2.855),
    ]]
    chamfer(chamfer_2_edges, length=CHAMFER_2_SIZE, length2=CHAMFER_2_SIZE2, reference=chamfer_2_side[0])

    # Эскиз8 → Вырез-Вытянуть3 (cut)
    with BuildSketch(Plane(origin=(0, 0, -4.1), x_dir=(-1, 0, 0), z_dir=(0, 0, -1))):
        Circle(SKETCH_8_R)
    extrude(amount=-CUT_EXTRUDE_3_DEPTH, mode=Mode.SUBTRACT)


solid = part.part
